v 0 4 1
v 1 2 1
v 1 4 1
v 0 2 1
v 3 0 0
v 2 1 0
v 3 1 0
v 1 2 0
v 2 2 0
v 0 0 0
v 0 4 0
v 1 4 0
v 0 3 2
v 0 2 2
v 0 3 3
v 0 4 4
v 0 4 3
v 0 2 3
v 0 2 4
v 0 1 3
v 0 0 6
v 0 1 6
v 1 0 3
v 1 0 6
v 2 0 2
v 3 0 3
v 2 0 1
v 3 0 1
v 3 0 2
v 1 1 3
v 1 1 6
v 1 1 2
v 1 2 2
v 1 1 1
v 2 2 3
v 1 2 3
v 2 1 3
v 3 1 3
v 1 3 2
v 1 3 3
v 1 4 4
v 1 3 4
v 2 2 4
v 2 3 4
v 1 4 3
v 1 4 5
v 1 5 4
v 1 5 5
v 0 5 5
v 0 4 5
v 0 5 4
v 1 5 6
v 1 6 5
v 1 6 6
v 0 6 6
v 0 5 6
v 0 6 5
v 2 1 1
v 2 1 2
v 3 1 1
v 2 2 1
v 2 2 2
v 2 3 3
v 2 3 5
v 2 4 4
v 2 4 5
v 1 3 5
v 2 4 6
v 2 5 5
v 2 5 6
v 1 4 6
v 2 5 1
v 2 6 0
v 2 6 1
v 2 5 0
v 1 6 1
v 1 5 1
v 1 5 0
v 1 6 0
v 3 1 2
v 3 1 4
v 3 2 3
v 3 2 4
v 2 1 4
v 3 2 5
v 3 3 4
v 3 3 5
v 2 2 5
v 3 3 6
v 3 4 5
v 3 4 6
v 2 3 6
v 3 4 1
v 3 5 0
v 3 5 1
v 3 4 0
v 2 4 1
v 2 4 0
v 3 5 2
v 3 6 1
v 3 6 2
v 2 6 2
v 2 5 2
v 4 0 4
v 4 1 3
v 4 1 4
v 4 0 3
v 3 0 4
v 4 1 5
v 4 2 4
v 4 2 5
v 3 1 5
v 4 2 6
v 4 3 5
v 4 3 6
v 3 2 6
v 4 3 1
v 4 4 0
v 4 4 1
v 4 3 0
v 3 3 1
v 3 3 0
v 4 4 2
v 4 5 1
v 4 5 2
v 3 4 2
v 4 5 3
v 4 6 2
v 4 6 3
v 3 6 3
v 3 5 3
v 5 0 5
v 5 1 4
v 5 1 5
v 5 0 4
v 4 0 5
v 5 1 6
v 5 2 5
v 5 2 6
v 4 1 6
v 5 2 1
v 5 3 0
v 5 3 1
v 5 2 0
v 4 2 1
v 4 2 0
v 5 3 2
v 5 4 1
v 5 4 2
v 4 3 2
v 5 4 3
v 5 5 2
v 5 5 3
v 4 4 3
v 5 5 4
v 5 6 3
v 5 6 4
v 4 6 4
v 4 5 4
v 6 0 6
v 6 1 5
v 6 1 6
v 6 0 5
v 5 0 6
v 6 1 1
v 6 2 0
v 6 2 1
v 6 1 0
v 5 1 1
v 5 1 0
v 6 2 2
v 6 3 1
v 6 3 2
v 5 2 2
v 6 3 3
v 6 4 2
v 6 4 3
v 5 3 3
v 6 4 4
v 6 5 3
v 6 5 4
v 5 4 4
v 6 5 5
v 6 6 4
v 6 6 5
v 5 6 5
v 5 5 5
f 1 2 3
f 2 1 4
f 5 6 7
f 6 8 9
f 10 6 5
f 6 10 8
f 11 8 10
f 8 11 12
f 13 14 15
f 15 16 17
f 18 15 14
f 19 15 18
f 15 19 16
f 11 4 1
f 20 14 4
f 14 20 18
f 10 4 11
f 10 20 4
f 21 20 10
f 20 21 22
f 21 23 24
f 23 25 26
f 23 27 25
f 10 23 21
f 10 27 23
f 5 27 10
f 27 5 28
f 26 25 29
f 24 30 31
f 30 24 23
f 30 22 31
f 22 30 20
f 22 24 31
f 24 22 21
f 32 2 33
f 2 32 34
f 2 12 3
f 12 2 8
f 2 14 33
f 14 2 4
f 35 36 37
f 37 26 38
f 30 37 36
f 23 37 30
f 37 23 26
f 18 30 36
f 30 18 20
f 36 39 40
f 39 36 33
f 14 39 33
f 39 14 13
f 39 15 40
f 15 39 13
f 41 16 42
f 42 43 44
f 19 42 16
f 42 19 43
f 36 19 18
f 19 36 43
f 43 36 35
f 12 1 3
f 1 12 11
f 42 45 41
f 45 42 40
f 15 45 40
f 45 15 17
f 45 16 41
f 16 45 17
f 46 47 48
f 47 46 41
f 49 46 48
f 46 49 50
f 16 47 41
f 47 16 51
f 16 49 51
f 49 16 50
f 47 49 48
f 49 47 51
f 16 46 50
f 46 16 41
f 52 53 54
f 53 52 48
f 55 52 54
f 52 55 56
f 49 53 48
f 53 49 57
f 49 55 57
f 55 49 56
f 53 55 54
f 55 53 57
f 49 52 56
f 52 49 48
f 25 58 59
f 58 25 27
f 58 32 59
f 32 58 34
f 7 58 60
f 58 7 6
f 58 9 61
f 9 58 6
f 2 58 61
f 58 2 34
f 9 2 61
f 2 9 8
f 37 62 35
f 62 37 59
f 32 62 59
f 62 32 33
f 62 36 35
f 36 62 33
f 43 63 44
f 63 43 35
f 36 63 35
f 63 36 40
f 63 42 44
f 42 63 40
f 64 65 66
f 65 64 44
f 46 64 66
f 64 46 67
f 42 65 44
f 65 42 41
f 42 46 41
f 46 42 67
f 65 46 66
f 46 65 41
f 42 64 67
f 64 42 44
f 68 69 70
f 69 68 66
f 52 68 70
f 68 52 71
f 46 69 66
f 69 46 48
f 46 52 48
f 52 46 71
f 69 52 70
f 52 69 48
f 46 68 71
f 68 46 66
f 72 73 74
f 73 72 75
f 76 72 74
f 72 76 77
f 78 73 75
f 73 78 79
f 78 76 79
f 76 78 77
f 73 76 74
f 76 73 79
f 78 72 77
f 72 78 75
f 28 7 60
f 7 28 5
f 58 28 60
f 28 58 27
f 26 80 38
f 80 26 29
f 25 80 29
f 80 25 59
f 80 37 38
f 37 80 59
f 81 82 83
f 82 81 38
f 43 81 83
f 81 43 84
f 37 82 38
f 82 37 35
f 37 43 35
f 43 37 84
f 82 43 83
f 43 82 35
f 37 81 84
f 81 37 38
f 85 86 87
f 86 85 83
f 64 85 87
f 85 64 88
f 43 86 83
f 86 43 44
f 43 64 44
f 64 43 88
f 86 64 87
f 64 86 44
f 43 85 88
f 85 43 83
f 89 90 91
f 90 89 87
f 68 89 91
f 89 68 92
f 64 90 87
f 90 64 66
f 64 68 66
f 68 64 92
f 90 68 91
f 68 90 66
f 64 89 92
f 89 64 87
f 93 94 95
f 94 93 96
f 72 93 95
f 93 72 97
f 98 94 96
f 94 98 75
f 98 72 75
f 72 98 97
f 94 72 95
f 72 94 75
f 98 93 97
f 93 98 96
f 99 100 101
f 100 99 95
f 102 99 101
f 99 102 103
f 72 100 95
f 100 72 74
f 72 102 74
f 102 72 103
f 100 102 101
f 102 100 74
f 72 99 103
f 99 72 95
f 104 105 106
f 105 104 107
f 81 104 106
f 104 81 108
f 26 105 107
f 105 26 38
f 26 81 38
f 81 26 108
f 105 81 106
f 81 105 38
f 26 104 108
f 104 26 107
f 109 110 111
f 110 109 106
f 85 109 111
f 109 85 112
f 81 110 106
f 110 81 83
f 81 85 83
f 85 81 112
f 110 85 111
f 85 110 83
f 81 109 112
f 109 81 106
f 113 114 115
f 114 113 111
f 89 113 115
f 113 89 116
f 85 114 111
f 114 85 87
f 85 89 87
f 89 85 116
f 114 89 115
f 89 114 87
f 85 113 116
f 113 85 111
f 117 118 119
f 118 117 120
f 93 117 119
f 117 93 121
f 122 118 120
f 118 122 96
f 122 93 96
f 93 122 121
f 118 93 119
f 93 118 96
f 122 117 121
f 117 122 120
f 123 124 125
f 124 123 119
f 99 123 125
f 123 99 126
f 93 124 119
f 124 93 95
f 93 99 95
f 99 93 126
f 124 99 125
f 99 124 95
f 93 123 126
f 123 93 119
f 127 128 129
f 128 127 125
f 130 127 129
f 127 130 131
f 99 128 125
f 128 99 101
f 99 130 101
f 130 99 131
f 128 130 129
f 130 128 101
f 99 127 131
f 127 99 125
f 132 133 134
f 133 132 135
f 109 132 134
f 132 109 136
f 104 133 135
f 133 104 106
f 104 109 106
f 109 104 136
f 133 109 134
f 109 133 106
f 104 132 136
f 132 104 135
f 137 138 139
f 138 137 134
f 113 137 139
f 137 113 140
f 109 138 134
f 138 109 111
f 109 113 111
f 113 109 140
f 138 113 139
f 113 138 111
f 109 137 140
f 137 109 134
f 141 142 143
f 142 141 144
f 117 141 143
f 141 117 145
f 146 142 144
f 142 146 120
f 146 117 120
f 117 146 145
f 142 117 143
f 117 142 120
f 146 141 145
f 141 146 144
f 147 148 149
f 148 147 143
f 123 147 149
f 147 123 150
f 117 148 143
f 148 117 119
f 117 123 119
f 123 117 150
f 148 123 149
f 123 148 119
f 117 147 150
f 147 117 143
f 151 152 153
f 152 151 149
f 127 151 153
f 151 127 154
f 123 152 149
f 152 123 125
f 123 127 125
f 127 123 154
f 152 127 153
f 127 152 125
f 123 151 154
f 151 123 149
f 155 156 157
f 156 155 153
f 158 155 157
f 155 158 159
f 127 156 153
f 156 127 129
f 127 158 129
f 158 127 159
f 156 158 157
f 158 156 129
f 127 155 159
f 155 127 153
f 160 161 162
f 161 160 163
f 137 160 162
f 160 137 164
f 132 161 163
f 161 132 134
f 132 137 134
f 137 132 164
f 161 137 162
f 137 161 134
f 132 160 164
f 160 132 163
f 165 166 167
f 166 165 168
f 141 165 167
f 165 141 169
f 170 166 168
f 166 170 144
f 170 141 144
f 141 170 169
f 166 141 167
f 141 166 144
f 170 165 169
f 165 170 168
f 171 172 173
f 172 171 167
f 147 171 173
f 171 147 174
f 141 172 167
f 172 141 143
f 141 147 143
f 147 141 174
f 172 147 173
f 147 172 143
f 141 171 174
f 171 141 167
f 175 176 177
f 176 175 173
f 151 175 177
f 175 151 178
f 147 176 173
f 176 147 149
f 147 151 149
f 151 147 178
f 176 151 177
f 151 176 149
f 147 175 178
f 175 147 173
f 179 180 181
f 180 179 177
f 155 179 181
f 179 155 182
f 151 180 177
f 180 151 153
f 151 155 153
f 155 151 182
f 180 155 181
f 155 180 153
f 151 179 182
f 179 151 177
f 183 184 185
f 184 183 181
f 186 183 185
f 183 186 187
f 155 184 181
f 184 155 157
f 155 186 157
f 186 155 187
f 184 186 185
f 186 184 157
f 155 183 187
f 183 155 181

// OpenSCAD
union() {
    translate([0.0, 0.0, 0.0]) cube([1, 1, 1]);
    translate([0.0, 0.0, 1.0]) cube([1, 1, 1]);
    translate([0.0, 0.0, 2.0]) cube([1, 1, 1]);
    translate([0.0, 0.0, 3.0]) cube([1, 1, 1]);
    translate([0.0, 0.0, 4.0]) cube([1, 1, 1]);
    translate([0.0, 0.0, 5.0]) cube([1, 1, 1]);
    translate([0.0, 1.0, 0.0]) cube([1, 1, 1]);
    translate([0.0, 1.0, 1.0]) cube([1, 1, 1]);
    translate([0.0, 1.0, 2.0]) cube([1, 1, 1]);
    translate([0.0, 2.0, 0.0]) cube([1, 1, 1]);
    translate([0.0, 2.0, 2.0]) cube([1, 1, 1]);
    translate([0.0, 2.0, 3.0]) cube([1, 1, 1]);
    translate([0.0, 3.0, 0.0]) cube([1, 1, 1]);
    translate([0.0, 3.0, 3.0]) cube([1, 1, 1]);
    translate([0.0, 4.0, 4.0]) cube([1, 1, 1]);
    translate([0.0, 5.0, 5.0]) cube([1, 1, 1]);
    translate([1.0, 0.0, 0.0]) cube([1, 1, 1]);
    translate([1.0, 0.0, 1.0]) cube([1, 1, 1]);
    translate([1.0, 0.0, 2.0]) cube([1, 1, 1]);
    translate([1.0, 1.0, 0.0]) cube([1, 1, 1]);
    translate([1.0, 1.0, 2.0]) cube([1, 1, 1]);
    translate([1.0, 2.0, 3.0]) cube([1, 1, 1]);
    translate([1.0, 3.0, 4.0]) cube([1, 1, 1]);
    translate([1.0, 4.0, 5.0]) cube([1, 1, 1]);
    translate([1.0, 5.0, 0.0]) cube([1, 1, 1]);
    translate([2.0, 0.0, 0.0]) cube([1, 1, 1]);
    translate([2.0, 0.0, 2.0]) cube([1, 1, 1]);
    translate([2.0, 1.0, 3.0]) cube([1, 1, 1]);
    translate([2.0, 2.0, 4.0]) cube([1, 1, 1]);
    translate([2.0, 3.0, 5.0]) cube([1, 1, 1]);
    translate([2.0, 4.0, 0.0]) cube([1, 1, 1]);
    translate([2.0, 5.0, 1.0]) cube([1, 1, 1]);
    translate([3.0, 0.0, 3.0]) cube([1, 1, 1]);
    translate([3.0, 1.0, 4.0]) cube([1, 1, 1]);
    translate([3.0, 2.0, 5.0]) cube([1, 1, 1]);
    translate([3.0, 3.0, 0.0]) cube([1, 1, 1]);
    translate([3.0, 4.0, 1.0]) cube([1, 1, 1]);
    translate([3.0, 5.0, 2.0]) cube([1, 1, 1]);
    translate([4.0, 0.0, 4.0]) cube([1, 1, 1]);
    translate([4.0, 1.0, 5.0]) cube([1, 1, 1]);
    translate([4.0, 2.0, 0.0]) cube([1, 1, 1]);
    translate([4.0, 3.0, 1.0]) cube([1, 1, 1]);
    translate([4.0, 4.0, 2.0]) cube([1, 1, 1]);
    translate([4.0, 5.0, 3.0]) cube([1, 1, 1]);
    translate([5.0, 0.0, 5.0]) cube([1, 1, 1]);
    translate([5.0, 1.0, 0.0]) cube([1, 1, 1]);
    translate([5.0, 2.0, 1.0]) cube([1, 1, 1]);
    translate([5.0, 3.0, 2.0]) cube([1, 1, 1]);
    translate([5.0, 4.0, 3.0]) cube([1, 1, 1]);
    translate([5.0, 5.0, 4.0]) cube([1, 1, 1]);
}
